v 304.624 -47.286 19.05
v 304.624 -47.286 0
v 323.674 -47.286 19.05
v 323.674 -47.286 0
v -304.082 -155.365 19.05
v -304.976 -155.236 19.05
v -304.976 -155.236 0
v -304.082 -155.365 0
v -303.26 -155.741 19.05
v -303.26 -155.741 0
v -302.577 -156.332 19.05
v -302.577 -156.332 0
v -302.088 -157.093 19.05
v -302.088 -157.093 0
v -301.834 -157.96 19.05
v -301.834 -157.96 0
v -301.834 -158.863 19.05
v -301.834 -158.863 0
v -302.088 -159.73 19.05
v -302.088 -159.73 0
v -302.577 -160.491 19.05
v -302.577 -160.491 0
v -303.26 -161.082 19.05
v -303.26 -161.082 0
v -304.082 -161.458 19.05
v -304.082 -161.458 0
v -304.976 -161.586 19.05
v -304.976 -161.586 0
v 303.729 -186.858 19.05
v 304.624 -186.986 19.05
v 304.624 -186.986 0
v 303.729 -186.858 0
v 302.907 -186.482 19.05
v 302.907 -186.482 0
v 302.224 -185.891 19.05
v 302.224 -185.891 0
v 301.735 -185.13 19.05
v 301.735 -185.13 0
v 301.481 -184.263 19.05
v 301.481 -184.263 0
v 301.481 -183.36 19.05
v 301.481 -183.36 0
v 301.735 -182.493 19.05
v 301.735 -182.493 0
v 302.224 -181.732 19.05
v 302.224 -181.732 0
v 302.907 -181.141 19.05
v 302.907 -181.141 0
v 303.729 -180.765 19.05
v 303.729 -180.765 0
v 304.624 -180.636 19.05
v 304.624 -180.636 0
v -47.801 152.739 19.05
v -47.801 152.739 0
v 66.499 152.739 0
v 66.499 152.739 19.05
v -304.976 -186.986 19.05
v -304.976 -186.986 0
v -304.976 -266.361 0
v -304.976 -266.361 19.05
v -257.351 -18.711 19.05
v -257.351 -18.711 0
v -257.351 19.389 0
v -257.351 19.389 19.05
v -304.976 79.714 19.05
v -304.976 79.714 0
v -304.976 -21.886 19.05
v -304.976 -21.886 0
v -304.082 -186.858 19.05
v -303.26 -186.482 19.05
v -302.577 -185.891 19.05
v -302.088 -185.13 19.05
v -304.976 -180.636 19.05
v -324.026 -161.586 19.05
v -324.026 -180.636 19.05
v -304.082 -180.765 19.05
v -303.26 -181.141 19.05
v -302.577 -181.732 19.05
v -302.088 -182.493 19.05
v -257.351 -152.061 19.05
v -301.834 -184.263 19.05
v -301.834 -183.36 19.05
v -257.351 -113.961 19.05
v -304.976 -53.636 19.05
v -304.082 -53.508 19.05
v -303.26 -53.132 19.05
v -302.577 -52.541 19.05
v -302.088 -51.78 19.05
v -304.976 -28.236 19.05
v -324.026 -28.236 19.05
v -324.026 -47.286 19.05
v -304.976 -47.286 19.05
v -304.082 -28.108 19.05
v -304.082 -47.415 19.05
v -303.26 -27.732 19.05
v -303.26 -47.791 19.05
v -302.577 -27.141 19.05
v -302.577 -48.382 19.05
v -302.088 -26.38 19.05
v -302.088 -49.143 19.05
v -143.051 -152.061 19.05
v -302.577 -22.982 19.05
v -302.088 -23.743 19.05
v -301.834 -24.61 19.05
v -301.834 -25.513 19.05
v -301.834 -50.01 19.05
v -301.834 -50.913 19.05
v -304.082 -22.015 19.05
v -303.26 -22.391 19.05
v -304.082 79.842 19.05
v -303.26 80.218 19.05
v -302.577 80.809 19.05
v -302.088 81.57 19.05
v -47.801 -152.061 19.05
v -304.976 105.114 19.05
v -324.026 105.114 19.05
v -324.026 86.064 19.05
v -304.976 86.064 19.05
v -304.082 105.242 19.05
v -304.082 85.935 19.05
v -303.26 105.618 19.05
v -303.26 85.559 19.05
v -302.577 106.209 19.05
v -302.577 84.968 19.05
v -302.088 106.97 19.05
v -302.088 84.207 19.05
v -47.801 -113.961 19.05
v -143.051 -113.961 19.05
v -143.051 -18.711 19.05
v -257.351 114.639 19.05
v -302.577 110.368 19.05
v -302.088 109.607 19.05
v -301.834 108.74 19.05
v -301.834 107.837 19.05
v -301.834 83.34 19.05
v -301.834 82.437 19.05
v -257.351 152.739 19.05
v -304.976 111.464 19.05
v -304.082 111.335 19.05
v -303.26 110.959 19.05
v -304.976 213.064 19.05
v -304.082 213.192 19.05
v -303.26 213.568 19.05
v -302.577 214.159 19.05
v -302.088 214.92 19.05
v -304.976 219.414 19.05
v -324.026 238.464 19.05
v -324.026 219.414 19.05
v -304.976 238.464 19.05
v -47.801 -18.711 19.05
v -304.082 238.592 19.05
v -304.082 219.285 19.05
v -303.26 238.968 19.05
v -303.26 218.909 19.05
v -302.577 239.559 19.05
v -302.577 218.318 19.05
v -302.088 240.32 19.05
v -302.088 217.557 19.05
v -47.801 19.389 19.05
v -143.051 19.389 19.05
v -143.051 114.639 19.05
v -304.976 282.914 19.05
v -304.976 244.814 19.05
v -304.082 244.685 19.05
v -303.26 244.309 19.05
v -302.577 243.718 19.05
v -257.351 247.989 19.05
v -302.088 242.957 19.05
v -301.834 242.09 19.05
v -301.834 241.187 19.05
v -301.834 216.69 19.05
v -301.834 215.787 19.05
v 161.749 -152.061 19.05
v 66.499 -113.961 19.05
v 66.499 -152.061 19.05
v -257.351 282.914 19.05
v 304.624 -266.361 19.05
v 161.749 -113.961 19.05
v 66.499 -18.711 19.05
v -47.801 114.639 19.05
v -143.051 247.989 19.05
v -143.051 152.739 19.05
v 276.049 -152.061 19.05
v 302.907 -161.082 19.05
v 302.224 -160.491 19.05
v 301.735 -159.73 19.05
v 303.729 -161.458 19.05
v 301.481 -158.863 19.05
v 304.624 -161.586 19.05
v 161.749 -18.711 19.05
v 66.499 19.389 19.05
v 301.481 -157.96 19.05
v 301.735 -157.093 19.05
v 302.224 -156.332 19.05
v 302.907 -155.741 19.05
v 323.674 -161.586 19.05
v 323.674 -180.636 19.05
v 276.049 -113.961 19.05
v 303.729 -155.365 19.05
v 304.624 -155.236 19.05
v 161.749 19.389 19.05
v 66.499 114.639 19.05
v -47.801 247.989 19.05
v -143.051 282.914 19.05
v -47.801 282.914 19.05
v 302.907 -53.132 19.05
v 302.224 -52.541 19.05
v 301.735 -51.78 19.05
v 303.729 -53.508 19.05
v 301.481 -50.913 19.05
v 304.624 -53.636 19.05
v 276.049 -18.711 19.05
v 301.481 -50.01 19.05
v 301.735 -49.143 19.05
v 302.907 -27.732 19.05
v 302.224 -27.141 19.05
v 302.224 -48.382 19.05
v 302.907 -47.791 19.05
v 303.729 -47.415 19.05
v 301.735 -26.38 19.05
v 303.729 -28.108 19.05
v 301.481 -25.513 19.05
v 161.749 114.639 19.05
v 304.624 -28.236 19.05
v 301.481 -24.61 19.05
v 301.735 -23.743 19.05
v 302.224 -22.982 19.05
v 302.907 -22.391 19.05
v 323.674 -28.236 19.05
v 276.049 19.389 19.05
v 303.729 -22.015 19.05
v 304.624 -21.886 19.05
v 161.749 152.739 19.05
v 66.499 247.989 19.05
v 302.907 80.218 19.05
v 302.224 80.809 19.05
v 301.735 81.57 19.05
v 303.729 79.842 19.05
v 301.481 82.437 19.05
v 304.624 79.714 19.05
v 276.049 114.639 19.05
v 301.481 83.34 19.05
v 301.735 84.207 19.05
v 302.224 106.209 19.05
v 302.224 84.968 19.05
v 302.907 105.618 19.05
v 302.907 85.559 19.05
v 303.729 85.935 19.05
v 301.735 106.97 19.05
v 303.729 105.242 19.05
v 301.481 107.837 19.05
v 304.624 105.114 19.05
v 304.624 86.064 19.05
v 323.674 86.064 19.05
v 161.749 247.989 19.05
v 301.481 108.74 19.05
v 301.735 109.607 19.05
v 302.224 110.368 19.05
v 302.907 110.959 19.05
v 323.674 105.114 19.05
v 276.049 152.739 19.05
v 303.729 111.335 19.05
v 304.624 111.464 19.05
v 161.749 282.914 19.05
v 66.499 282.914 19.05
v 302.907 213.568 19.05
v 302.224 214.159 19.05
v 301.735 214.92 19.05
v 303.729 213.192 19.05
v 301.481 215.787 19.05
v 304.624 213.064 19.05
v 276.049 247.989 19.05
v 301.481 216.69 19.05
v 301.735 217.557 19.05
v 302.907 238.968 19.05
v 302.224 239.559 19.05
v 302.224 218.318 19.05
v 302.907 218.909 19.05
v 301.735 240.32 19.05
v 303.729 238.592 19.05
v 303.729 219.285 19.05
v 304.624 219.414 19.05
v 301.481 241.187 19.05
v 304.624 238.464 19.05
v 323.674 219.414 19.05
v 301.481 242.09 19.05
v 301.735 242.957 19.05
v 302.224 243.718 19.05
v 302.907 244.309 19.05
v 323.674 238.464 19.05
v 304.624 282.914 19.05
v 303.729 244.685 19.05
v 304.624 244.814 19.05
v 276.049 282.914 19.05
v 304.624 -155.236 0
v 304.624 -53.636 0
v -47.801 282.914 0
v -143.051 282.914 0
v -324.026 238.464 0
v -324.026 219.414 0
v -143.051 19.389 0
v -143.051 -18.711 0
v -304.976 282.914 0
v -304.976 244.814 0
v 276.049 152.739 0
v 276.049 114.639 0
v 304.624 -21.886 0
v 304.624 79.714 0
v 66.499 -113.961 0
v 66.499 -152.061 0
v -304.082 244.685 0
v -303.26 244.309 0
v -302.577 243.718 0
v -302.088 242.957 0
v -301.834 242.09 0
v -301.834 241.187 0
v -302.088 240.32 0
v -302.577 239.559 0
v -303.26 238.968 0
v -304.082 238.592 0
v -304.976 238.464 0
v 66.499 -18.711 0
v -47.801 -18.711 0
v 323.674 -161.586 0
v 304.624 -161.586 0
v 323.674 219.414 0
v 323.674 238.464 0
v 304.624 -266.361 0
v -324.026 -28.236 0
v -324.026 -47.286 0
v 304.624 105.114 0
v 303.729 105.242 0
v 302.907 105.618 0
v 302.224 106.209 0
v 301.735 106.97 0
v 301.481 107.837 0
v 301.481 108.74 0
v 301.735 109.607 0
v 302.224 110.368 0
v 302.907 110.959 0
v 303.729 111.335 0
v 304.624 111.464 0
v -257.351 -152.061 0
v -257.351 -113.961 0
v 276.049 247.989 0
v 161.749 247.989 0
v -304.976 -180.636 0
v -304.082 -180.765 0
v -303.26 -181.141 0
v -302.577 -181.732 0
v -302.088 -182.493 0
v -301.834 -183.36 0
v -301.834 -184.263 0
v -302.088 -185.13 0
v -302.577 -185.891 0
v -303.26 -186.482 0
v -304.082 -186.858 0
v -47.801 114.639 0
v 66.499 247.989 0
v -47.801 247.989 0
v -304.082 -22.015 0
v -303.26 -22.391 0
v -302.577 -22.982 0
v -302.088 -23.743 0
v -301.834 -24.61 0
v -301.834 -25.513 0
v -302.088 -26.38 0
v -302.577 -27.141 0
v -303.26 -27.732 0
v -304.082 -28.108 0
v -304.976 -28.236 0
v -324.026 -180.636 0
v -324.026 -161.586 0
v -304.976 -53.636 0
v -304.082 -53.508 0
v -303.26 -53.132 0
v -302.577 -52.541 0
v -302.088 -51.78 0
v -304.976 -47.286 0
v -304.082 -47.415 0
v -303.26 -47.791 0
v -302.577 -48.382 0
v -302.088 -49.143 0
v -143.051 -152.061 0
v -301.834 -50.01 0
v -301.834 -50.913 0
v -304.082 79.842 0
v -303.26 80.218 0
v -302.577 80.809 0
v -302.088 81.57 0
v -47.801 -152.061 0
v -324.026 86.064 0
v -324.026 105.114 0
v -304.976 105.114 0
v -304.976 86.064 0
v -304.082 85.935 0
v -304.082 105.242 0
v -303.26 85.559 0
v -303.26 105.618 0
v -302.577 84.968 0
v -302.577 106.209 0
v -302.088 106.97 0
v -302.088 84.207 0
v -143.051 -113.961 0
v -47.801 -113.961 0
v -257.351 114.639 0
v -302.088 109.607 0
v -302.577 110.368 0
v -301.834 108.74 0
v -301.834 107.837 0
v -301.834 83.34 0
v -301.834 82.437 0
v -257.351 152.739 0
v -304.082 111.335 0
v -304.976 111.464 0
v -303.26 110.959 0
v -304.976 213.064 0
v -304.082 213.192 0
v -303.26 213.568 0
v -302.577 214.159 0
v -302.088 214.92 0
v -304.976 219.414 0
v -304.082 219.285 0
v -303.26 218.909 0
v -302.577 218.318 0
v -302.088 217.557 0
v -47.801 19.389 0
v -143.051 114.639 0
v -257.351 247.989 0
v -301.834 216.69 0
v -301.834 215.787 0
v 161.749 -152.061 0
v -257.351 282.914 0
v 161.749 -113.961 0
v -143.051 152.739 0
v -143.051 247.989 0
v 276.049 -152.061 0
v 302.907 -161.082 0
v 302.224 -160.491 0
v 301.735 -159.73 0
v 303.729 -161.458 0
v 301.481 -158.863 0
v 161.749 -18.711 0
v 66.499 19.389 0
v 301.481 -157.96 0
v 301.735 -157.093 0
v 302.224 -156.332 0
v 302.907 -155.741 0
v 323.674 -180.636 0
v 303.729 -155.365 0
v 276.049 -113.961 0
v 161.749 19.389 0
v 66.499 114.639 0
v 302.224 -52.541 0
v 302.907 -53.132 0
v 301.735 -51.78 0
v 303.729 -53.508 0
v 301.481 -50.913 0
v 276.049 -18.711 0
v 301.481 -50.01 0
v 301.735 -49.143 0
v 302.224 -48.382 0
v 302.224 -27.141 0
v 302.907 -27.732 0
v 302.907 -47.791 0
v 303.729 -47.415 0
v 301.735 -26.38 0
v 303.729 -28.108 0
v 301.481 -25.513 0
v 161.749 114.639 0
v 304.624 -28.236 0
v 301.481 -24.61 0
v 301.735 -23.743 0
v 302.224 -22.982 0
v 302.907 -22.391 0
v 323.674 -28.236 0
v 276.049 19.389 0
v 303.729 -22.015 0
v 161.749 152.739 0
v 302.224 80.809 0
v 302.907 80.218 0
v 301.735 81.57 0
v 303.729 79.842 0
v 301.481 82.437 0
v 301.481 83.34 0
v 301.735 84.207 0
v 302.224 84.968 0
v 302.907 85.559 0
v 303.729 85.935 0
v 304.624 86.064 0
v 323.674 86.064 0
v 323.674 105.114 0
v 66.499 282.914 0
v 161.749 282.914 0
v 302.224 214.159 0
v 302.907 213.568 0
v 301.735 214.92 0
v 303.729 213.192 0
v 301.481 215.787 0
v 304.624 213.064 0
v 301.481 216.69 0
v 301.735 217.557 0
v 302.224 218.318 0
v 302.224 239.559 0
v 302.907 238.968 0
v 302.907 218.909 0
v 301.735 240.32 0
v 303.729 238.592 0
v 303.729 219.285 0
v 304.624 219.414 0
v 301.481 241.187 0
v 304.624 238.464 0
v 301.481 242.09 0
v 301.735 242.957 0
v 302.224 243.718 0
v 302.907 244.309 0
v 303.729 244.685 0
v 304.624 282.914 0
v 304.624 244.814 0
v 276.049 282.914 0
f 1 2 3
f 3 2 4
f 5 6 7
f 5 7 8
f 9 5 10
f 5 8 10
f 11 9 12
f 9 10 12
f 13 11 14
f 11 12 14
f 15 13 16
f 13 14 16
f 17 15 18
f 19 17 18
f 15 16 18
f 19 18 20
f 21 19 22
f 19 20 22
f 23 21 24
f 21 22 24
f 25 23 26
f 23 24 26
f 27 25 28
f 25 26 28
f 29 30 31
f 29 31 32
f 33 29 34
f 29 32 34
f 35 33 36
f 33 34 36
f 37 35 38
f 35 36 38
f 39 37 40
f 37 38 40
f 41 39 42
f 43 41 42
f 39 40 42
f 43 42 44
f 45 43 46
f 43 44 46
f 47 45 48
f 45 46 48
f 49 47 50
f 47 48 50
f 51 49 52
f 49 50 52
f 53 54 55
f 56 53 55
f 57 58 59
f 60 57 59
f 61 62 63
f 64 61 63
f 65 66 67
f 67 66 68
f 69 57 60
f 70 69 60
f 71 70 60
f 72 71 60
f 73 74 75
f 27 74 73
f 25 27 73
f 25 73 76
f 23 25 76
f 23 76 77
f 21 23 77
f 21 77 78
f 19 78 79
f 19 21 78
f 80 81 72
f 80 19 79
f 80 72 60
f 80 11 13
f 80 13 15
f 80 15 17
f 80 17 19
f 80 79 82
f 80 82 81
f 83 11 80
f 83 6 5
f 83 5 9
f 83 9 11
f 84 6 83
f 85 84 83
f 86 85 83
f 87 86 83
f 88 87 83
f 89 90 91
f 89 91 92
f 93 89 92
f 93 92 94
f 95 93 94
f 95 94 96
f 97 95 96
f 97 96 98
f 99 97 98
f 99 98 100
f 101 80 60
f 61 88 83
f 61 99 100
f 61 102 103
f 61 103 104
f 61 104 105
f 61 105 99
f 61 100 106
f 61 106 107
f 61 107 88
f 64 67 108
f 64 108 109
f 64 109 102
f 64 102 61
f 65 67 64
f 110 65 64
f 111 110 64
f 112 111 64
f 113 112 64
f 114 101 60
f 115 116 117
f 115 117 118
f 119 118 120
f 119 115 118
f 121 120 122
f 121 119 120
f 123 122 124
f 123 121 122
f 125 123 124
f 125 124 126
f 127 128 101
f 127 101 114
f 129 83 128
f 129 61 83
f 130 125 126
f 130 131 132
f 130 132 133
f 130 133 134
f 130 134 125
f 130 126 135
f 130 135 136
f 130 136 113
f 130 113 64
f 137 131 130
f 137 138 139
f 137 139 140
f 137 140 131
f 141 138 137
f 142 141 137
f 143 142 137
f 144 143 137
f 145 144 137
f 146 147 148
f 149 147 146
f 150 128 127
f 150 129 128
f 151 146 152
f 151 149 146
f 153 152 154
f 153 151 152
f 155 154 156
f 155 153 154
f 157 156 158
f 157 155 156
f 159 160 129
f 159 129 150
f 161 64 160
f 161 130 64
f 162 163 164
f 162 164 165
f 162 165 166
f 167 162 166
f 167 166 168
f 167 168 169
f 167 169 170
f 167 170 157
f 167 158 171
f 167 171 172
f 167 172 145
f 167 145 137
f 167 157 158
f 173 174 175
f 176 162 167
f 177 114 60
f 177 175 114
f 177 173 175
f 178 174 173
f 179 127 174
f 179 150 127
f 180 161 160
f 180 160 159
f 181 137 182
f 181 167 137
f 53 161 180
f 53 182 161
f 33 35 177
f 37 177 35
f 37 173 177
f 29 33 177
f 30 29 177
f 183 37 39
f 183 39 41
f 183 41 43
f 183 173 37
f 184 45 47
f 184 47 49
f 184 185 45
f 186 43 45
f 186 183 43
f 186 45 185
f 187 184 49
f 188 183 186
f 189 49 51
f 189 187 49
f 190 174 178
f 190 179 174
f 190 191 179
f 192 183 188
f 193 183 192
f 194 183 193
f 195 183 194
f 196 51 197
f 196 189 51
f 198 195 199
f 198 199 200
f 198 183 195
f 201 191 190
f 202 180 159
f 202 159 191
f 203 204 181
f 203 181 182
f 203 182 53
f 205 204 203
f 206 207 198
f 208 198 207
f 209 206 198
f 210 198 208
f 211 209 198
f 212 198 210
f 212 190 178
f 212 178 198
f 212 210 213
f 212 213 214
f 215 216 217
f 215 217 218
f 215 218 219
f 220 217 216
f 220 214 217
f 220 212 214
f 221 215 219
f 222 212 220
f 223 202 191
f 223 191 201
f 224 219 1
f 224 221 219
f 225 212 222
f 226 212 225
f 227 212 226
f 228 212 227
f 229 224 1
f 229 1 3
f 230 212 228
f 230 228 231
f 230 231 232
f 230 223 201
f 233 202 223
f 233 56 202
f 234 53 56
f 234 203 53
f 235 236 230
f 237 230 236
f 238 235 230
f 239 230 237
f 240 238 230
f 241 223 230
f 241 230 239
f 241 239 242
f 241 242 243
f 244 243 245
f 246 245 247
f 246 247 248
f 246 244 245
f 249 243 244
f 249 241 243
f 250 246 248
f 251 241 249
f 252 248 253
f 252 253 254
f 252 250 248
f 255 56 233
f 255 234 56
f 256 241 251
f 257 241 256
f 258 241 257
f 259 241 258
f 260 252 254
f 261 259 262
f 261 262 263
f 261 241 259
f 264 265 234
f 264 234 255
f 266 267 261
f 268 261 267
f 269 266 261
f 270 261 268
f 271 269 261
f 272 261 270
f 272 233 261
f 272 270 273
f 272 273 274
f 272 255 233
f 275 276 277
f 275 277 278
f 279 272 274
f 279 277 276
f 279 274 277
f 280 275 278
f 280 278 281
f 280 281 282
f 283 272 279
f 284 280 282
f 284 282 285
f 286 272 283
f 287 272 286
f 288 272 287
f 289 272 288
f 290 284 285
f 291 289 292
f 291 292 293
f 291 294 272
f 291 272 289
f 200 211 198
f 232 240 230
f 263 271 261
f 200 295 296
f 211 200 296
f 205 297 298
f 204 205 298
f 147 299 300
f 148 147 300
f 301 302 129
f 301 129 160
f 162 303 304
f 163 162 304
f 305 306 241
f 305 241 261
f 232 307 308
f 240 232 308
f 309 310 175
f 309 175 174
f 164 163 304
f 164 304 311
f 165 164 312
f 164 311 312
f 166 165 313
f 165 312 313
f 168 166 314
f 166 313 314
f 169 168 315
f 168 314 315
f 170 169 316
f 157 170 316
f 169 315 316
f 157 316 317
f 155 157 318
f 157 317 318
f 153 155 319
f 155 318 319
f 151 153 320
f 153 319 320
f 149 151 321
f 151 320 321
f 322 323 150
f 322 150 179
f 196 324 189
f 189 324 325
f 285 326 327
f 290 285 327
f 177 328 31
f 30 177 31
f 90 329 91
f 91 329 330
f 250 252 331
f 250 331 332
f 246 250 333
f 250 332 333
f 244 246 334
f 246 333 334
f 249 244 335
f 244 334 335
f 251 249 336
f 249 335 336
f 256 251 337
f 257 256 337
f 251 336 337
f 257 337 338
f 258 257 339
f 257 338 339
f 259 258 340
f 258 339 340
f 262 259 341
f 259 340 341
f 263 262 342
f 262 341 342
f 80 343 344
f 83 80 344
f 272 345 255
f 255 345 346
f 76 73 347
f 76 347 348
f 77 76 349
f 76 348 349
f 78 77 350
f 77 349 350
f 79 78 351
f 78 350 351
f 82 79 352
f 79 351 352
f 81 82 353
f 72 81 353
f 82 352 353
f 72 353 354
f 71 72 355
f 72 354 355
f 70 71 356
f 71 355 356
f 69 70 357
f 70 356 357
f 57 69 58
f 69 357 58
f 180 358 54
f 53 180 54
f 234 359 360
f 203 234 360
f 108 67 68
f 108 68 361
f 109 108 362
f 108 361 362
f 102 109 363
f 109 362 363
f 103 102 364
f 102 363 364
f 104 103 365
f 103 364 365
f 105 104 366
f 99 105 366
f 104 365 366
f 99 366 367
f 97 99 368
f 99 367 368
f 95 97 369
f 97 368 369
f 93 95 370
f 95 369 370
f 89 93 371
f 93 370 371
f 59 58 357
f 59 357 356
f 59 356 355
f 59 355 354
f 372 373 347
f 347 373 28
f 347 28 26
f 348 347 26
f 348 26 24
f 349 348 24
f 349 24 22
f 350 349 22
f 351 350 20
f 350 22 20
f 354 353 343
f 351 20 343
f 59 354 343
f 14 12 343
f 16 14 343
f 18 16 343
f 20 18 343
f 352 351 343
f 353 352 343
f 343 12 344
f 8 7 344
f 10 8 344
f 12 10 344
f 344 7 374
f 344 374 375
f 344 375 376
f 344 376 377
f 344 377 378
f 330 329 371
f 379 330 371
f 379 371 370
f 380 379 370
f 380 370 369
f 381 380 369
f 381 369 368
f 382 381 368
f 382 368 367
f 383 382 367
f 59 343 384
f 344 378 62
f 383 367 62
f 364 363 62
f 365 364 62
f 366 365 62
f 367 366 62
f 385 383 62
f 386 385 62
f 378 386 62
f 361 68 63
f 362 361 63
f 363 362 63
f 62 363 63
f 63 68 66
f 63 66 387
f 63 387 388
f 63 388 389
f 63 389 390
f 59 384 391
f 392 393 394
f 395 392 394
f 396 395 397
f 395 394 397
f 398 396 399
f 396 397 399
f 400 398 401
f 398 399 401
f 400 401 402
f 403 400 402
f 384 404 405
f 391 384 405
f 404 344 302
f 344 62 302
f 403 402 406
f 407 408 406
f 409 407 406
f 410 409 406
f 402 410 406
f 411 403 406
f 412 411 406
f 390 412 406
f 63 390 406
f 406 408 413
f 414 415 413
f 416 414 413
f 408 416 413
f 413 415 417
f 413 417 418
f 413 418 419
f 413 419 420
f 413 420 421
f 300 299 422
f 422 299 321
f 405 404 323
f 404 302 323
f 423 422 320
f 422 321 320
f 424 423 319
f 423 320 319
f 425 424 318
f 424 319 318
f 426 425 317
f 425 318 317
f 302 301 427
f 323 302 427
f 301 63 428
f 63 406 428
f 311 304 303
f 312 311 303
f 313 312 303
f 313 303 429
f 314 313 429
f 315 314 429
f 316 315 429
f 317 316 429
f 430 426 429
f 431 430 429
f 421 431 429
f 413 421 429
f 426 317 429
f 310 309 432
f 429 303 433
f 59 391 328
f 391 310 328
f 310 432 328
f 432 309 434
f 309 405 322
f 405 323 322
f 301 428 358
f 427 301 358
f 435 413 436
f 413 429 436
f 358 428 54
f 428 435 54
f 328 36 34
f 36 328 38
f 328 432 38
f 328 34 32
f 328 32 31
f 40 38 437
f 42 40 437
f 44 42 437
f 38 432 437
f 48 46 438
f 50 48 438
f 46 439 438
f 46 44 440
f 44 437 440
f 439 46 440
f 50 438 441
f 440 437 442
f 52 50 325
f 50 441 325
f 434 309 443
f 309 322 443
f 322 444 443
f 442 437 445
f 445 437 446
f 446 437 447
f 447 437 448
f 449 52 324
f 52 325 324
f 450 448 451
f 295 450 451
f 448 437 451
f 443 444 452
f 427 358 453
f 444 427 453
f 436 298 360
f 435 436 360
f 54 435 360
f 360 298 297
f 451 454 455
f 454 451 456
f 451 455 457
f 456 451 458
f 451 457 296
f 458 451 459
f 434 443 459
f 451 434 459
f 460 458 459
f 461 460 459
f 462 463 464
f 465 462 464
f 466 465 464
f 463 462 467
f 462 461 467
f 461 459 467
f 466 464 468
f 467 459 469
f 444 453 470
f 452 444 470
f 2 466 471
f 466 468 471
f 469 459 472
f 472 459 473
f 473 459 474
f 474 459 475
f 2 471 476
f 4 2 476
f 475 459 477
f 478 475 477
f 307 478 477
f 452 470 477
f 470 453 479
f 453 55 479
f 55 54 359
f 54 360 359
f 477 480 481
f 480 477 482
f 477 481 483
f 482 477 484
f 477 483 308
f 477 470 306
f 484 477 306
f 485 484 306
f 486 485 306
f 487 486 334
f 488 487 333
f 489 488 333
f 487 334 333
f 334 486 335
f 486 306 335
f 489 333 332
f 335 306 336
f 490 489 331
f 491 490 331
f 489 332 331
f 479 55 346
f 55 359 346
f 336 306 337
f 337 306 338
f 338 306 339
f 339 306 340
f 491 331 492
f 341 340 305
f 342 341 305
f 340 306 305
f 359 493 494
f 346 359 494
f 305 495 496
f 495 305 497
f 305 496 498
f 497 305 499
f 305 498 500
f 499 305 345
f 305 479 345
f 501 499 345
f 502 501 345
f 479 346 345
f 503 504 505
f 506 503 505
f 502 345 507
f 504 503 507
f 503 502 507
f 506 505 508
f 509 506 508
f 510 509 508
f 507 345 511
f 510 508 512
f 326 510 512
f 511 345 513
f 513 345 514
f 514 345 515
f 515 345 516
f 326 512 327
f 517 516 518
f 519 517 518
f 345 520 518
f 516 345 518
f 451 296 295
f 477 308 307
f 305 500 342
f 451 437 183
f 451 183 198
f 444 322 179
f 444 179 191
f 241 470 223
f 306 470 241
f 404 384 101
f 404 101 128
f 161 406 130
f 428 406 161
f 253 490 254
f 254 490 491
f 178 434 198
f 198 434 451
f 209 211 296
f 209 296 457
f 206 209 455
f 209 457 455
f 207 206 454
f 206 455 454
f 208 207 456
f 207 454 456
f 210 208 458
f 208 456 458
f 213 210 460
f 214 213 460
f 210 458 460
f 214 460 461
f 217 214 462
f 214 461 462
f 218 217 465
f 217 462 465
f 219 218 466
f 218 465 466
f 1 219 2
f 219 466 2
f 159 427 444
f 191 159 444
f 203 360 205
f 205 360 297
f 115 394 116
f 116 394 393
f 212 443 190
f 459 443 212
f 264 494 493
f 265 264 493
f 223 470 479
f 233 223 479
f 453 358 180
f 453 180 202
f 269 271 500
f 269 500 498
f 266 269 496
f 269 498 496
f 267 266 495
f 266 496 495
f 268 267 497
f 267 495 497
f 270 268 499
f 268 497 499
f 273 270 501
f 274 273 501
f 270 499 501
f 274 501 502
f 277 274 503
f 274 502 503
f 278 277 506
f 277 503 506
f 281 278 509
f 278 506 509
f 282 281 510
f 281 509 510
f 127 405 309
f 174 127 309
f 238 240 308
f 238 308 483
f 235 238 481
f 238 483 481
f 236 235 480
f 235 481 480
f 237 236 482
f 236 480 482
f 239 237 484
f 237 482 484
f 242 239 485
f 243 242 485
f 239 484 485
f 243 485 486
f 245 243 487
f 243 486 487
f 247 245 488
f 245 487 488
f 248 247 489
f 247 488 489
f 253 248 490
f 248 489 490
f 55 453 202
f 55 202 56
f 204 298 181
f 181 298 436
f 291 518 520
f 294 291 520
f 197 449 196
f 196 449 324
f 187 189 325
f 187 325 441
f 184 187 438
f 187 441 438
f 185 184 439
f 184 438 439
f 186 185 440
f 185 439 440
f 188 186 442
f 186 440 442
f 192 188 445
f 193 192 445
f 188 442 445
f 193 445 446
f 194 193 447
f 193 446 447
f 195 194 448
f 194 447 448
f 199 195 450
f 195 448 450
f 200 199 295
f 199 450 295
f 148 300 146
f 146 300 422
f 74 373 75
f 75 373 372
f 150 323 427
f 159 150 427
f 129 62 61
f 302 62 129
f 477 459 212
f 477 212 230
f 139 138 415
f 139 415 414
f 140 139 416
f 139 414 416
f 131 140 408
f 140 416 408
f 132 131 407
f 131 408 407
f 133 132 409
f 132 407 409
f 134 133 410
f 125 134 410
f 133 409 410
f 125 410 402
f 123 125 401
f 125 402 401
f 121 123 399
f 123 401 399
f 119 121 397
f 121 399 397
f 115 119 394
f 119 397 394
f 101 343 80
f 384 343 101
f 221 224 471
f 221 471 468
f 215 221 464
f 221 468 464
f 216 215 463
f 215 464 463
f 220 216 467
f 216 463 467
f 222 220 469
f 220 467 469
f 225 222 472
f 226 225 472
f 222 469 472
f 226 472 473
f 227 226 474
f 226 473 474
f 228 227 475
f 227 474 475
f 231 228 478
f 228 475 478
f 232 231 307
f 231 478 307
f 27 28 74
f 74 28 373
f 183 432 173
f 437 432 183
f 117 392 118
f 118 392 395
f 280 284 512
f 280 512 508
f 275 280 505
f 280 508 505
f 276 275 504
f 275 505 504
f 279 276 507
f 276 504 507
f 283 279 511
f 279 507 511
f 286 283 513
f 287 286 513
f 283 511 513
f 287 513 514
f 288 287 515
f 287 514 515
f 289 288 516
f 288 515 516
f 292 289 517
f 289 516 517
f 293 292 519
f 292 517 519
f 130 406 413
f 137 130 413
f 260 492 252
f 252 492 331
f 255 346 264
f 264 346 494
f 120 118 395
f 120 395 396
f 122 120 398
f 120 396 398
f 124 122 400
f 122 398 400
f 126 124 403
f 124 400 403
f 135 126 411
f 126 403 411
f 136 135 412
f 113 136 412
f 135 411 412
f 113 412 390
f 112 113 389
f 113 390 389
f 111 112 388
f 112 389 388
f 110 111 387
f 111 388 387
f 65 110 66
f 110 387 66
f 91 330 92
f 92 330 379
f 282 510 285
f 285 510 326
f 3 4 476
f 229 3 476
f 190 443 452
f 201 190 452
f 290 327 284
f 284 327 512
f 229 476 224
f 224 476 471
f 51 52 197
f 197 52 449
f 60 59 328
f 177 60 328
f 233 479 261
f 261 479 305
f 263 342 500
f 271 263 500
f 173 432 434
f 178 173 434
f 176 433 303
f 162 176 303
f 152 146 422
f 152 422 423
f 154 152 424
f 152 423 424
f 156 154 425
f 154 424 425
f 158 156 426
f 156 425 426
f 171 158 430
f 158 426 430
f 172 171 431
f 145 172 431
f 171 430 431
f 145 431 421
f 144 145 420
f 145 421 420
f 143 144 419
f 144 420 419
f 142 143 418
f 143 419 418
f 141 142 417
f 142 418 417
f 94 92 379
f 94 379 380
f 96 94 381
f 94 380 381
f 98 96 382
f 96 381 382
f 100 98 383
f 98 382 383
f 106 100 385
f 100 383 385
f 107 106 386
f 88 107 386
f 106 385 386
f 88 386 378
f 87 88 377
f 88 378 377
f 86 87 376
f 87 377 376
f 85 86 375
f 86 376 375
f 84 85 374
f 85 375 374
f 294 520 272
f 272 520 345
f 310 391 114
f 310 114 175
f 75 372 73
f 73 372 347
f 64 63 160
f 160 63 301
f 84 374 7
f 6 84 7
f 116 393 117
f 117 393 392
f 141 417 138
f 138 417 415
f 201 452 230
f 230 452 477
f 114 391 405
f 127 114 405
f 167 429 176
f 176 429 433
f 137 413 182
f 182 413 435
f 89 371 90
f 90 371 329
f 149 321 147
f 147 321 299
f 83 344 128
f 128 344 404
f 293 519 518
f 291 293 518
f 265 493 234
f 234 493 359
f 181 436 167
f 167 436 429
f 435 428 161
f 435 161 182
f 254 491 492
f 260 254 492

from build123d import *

# Parameters (mm, degrees)
SKETCH8_W           = 114.3
SKETCH8_H           = 38.1
BOSS_EXTRUDE3_DEPTH = 19.05


with BuildPart() as part:
    # Sketch8 → Boss-Extrude3 (new body)
    with BuildSketch(Plane.XY):
        with BuildLine():
            Line((-257.351483657, 282.913503235), (-304.976483657, 282.913503235))
            Line((-304.976483657, 282.913503235), (-304.976483657, 244.813503235))
            ThreePointArc((-304.976483657, 244.813503235), (-301.801483657, 241.638503235), (-304.976483657, 238.463503235))
            Line((-304.976483657, 238.463503235), (-324.026483657, 238.463503235))
            Line((-324.026483657, 238.463503235), (-324.026483657, 219.413503235))
            Line((-324.026483657, 219.413503235), (-304.976483657, 219.413503235))
            ThreePointArc((-304.976483657, 219.413503235), (-301.801483657, 216.238503235), (-304.976483657, 213.063503235))
            Line((-304.976483657, 213.063503235), (-304.976483657, 111.463503235))
            ThreePointArc((-304.976483657, 111.463503235), (-301.801483657, 108.288503235), (-304.976483657, 105.113503235))
            Line((-304.976483657, 105.113503235), (-324.026483657, 105.113503235))
            Line((-324.026483657, 105.113503235), (-324.026483657, 86.063503235))
            Line((-324.026483657, 86.063503235), (-304.976483657, 86.063503235))
            ThreePointArc((-304.976483657, 86.063503235), (-301.801483657, 82.888503235), (-304.976483657, 79.713503235))
            Line((-304.976483657, 79.713503235), (-304.976483657, -21.886496765))
            ThreePointArc((-304.976483657, -21.886496765), (-301.801483657, -25.061496765), (-304.976483657, -28.236496765))
            Line((-304.976483657, -28.236496765), (-324.026483657, -28.236496765))
            Line((-324.026483657, -28.236496765), (-324.026483657, -47.286496765))
            Line((-324.026483657, -47.286496765), (-304.976483657, -47.286496765))
            ThreePointArc((-304.976483657, -47.286496765), (-301.801483657, -50.461496765), (-304.976483657, -53.636496765))
            Line((-304.976483657, -53.636496765), (-304.976483657, -155.236496765))
            ThreePointArc((-304.976483657, -155.236496765), (-301.801483657, -158.411496765), (-304.976483657, -161.586496765))
            Line((-304.976483657, -161.586496765), (-324.026483657, -161.586496765))
            Line((-324.026483657, -161.586496765), (-324.026483657, -180.636496765))
            Line((-324.026483657, -180.636496765), (-304.976483657, -180.636496765))
            ThreePointArc((-304.976483657, -180.636496765), (-301.801483657, -183.811496765), (-304.976483657, -186.986496765))
            Line((-304.976483657, -186.986496765), (-304.976483657, -266.361496765))
            Line((-304.976483657, -266.361496765), (304.623516343, -266.361496765))
            Line((304.623516343, -266.361496765), (304.623516343, -186.986496765))
            ThreePointArc((304.623516343, -186.986496765), (301.448516343, -183.811496765), (304.623516343, -180.636496765))
            Line((304.623516343, -180.636496765), (323.673516343, -180.636496765))
            Line((323.673516343, -180.636496765), (323.673516343, -161.586496765))
            Line((323.673516343, -161.586496765), (304.623516343, -161.586496765))
            ThreePointArc((304.623516343, -161.586496765), (301.448516343, -158.411496765), (304.623516343, -155.236496765))
            Line((304.623516343, -155.236496765), (304.623516343, -53.636496765))
            ThreePointArc((304.623516343, -53.636496765), (301.448516343, -50.461496765), (304.623516343, -47.286496765))
            Line((304.623516343, -47.286496765), (323.673516343, -47.286496765))
            Line((323.673516343, -47.286496765), (323.673516343, -28.236496765))
            Line((323.673516343, -28.236496765), (304.623516343, -28.236496765))
            ThreePointArc((304.623516343, -28.236496765), (301.448516343, -25.061496765), (304.623516343, -21.886496765))
            Line((304.623516343, -21.886496765), (304.623516343, 79.713503235))
            ThreePointArc((304.623516343, 79.713503235), (301.448516343, 82.888503235), (304.623516343, 86.063503235))
            Line((304.623516343, 86.063503235), (323.673516343, 86.063503235))
            Line((323.673516343, 86.063503235), (323.673516343, 105.113503235))
            Line((323.673516343, 105.113503235), (304.623516343, 105.113503235))
            ThreePointArc((304.623516343, 105.113503235), (301.448516343, 108.288503235), (304.623516343, 111.463503235))
            Line((304.623516343, 111.463503235), (304.623516343, 213.063503235))
            ThreePointArc((304.623516343, 213.063503235), (301.448516343, 216.238503235), (304.623516343, 219.413503235))
            Line((304.623516343, 219.413503235), (323.673516343, 219.413503235))
            Line((323.673516343, 219.413503235), (323.673516343, 238.463503235))
            Line((323.673516343, 238.463503235), (304.623516343, 238.463503235))
            ThreePointArc((304.623516343, 238.463503235), (301.448516343, 241.638503235), (304.623516343, 244.813503235))
            Line((304.623516343, 244.813503235), (304.623516343, 282.913503235))
            Line((304.623516343, 282.913503235), (276.048516343, 282.913503235))
            Line((276.048516343, 282.913503235), (276.048516343, 247.988503235))
            Line((276.048516343, 247.988503235), (161.748516343, 247.988503235))
            Line((161.748516343, 247.988503235), (161.748516343, 282.913503235))
            Line((161.748516343, 282.913503235), (66.498516343, 282.913503235))
            Line((66.498516343, 282.913503235), (66.498516343, 247.988503235))
            Line((66.498516343, 247.988503235), (-47.801483657, 247.988503235))
            Line((-47.801483657, 247.988503235), (-47.801483657, 282.913503235))
            Line((-47.801483657, 282.913503235), (-143.051483657, 282.913503235))
            Line((-143.051483657, 282.913503235), (-143.051483657, 247.988503235))
            Line((-143.051483657, 247.988503235), (-257.351483657, 247.988503235))
            Line((-257.351483657, 247.988503235), (-257.351483657, 282.913503235))
        make_face()
        with Locations((-200.201483657, -133.011496765)):
            Rectangle(SKETCH8_W, SKETCH8_H, mode=Mode.SUBTRACT)
        with Locations((-200.201483657, 0.338503235)):
            Rectangle(SKETCH8_W, SKETCH8_H, mode=Mode.SUBTRACT)
        with Locations((9.348516343, -133.011496765)):
            Rectangle(SKETCH8_W, SKETCH8_H, mode=Mode.SUBTRACT)
        with Locations((218.898516343, -133.011496765)):
            Rectangle(SKETCH8_W, SKETCH8_H, mode=Mode.SUBTRACT)
        with Locations((9.348516343, 0.338503235)):
            Rectangle(SKETCH8_W, SKETCH8_H, mode=Mode.SUBTRACT)
        with Locations((218.898516343, 0.338503235)):
            Rectangle(SKETCH8_W, SKETCH8_H, mode=Mode.SUBTRACT)
        with Locations((-200.201483657, 133.688503235)):
            Rectangle(SKETCH8_W, SKETCH8_H, mode=Mode.SUBTRACT)
        with Locations((9.348516343, 133.688503235)):
            Rectangle(SKETCH8_W, SKETCH8_H, mode=Mode.SUBTRACT)
        with Locations((218.898516343, 133.688503235)):
            Rectangle(SKETCH8_W, SKETCH8_H, mode=Mode.SUBTRACT)
    extrude(amount=BOSS_EXTRUDE3_DEPTH)


solid = part.part
